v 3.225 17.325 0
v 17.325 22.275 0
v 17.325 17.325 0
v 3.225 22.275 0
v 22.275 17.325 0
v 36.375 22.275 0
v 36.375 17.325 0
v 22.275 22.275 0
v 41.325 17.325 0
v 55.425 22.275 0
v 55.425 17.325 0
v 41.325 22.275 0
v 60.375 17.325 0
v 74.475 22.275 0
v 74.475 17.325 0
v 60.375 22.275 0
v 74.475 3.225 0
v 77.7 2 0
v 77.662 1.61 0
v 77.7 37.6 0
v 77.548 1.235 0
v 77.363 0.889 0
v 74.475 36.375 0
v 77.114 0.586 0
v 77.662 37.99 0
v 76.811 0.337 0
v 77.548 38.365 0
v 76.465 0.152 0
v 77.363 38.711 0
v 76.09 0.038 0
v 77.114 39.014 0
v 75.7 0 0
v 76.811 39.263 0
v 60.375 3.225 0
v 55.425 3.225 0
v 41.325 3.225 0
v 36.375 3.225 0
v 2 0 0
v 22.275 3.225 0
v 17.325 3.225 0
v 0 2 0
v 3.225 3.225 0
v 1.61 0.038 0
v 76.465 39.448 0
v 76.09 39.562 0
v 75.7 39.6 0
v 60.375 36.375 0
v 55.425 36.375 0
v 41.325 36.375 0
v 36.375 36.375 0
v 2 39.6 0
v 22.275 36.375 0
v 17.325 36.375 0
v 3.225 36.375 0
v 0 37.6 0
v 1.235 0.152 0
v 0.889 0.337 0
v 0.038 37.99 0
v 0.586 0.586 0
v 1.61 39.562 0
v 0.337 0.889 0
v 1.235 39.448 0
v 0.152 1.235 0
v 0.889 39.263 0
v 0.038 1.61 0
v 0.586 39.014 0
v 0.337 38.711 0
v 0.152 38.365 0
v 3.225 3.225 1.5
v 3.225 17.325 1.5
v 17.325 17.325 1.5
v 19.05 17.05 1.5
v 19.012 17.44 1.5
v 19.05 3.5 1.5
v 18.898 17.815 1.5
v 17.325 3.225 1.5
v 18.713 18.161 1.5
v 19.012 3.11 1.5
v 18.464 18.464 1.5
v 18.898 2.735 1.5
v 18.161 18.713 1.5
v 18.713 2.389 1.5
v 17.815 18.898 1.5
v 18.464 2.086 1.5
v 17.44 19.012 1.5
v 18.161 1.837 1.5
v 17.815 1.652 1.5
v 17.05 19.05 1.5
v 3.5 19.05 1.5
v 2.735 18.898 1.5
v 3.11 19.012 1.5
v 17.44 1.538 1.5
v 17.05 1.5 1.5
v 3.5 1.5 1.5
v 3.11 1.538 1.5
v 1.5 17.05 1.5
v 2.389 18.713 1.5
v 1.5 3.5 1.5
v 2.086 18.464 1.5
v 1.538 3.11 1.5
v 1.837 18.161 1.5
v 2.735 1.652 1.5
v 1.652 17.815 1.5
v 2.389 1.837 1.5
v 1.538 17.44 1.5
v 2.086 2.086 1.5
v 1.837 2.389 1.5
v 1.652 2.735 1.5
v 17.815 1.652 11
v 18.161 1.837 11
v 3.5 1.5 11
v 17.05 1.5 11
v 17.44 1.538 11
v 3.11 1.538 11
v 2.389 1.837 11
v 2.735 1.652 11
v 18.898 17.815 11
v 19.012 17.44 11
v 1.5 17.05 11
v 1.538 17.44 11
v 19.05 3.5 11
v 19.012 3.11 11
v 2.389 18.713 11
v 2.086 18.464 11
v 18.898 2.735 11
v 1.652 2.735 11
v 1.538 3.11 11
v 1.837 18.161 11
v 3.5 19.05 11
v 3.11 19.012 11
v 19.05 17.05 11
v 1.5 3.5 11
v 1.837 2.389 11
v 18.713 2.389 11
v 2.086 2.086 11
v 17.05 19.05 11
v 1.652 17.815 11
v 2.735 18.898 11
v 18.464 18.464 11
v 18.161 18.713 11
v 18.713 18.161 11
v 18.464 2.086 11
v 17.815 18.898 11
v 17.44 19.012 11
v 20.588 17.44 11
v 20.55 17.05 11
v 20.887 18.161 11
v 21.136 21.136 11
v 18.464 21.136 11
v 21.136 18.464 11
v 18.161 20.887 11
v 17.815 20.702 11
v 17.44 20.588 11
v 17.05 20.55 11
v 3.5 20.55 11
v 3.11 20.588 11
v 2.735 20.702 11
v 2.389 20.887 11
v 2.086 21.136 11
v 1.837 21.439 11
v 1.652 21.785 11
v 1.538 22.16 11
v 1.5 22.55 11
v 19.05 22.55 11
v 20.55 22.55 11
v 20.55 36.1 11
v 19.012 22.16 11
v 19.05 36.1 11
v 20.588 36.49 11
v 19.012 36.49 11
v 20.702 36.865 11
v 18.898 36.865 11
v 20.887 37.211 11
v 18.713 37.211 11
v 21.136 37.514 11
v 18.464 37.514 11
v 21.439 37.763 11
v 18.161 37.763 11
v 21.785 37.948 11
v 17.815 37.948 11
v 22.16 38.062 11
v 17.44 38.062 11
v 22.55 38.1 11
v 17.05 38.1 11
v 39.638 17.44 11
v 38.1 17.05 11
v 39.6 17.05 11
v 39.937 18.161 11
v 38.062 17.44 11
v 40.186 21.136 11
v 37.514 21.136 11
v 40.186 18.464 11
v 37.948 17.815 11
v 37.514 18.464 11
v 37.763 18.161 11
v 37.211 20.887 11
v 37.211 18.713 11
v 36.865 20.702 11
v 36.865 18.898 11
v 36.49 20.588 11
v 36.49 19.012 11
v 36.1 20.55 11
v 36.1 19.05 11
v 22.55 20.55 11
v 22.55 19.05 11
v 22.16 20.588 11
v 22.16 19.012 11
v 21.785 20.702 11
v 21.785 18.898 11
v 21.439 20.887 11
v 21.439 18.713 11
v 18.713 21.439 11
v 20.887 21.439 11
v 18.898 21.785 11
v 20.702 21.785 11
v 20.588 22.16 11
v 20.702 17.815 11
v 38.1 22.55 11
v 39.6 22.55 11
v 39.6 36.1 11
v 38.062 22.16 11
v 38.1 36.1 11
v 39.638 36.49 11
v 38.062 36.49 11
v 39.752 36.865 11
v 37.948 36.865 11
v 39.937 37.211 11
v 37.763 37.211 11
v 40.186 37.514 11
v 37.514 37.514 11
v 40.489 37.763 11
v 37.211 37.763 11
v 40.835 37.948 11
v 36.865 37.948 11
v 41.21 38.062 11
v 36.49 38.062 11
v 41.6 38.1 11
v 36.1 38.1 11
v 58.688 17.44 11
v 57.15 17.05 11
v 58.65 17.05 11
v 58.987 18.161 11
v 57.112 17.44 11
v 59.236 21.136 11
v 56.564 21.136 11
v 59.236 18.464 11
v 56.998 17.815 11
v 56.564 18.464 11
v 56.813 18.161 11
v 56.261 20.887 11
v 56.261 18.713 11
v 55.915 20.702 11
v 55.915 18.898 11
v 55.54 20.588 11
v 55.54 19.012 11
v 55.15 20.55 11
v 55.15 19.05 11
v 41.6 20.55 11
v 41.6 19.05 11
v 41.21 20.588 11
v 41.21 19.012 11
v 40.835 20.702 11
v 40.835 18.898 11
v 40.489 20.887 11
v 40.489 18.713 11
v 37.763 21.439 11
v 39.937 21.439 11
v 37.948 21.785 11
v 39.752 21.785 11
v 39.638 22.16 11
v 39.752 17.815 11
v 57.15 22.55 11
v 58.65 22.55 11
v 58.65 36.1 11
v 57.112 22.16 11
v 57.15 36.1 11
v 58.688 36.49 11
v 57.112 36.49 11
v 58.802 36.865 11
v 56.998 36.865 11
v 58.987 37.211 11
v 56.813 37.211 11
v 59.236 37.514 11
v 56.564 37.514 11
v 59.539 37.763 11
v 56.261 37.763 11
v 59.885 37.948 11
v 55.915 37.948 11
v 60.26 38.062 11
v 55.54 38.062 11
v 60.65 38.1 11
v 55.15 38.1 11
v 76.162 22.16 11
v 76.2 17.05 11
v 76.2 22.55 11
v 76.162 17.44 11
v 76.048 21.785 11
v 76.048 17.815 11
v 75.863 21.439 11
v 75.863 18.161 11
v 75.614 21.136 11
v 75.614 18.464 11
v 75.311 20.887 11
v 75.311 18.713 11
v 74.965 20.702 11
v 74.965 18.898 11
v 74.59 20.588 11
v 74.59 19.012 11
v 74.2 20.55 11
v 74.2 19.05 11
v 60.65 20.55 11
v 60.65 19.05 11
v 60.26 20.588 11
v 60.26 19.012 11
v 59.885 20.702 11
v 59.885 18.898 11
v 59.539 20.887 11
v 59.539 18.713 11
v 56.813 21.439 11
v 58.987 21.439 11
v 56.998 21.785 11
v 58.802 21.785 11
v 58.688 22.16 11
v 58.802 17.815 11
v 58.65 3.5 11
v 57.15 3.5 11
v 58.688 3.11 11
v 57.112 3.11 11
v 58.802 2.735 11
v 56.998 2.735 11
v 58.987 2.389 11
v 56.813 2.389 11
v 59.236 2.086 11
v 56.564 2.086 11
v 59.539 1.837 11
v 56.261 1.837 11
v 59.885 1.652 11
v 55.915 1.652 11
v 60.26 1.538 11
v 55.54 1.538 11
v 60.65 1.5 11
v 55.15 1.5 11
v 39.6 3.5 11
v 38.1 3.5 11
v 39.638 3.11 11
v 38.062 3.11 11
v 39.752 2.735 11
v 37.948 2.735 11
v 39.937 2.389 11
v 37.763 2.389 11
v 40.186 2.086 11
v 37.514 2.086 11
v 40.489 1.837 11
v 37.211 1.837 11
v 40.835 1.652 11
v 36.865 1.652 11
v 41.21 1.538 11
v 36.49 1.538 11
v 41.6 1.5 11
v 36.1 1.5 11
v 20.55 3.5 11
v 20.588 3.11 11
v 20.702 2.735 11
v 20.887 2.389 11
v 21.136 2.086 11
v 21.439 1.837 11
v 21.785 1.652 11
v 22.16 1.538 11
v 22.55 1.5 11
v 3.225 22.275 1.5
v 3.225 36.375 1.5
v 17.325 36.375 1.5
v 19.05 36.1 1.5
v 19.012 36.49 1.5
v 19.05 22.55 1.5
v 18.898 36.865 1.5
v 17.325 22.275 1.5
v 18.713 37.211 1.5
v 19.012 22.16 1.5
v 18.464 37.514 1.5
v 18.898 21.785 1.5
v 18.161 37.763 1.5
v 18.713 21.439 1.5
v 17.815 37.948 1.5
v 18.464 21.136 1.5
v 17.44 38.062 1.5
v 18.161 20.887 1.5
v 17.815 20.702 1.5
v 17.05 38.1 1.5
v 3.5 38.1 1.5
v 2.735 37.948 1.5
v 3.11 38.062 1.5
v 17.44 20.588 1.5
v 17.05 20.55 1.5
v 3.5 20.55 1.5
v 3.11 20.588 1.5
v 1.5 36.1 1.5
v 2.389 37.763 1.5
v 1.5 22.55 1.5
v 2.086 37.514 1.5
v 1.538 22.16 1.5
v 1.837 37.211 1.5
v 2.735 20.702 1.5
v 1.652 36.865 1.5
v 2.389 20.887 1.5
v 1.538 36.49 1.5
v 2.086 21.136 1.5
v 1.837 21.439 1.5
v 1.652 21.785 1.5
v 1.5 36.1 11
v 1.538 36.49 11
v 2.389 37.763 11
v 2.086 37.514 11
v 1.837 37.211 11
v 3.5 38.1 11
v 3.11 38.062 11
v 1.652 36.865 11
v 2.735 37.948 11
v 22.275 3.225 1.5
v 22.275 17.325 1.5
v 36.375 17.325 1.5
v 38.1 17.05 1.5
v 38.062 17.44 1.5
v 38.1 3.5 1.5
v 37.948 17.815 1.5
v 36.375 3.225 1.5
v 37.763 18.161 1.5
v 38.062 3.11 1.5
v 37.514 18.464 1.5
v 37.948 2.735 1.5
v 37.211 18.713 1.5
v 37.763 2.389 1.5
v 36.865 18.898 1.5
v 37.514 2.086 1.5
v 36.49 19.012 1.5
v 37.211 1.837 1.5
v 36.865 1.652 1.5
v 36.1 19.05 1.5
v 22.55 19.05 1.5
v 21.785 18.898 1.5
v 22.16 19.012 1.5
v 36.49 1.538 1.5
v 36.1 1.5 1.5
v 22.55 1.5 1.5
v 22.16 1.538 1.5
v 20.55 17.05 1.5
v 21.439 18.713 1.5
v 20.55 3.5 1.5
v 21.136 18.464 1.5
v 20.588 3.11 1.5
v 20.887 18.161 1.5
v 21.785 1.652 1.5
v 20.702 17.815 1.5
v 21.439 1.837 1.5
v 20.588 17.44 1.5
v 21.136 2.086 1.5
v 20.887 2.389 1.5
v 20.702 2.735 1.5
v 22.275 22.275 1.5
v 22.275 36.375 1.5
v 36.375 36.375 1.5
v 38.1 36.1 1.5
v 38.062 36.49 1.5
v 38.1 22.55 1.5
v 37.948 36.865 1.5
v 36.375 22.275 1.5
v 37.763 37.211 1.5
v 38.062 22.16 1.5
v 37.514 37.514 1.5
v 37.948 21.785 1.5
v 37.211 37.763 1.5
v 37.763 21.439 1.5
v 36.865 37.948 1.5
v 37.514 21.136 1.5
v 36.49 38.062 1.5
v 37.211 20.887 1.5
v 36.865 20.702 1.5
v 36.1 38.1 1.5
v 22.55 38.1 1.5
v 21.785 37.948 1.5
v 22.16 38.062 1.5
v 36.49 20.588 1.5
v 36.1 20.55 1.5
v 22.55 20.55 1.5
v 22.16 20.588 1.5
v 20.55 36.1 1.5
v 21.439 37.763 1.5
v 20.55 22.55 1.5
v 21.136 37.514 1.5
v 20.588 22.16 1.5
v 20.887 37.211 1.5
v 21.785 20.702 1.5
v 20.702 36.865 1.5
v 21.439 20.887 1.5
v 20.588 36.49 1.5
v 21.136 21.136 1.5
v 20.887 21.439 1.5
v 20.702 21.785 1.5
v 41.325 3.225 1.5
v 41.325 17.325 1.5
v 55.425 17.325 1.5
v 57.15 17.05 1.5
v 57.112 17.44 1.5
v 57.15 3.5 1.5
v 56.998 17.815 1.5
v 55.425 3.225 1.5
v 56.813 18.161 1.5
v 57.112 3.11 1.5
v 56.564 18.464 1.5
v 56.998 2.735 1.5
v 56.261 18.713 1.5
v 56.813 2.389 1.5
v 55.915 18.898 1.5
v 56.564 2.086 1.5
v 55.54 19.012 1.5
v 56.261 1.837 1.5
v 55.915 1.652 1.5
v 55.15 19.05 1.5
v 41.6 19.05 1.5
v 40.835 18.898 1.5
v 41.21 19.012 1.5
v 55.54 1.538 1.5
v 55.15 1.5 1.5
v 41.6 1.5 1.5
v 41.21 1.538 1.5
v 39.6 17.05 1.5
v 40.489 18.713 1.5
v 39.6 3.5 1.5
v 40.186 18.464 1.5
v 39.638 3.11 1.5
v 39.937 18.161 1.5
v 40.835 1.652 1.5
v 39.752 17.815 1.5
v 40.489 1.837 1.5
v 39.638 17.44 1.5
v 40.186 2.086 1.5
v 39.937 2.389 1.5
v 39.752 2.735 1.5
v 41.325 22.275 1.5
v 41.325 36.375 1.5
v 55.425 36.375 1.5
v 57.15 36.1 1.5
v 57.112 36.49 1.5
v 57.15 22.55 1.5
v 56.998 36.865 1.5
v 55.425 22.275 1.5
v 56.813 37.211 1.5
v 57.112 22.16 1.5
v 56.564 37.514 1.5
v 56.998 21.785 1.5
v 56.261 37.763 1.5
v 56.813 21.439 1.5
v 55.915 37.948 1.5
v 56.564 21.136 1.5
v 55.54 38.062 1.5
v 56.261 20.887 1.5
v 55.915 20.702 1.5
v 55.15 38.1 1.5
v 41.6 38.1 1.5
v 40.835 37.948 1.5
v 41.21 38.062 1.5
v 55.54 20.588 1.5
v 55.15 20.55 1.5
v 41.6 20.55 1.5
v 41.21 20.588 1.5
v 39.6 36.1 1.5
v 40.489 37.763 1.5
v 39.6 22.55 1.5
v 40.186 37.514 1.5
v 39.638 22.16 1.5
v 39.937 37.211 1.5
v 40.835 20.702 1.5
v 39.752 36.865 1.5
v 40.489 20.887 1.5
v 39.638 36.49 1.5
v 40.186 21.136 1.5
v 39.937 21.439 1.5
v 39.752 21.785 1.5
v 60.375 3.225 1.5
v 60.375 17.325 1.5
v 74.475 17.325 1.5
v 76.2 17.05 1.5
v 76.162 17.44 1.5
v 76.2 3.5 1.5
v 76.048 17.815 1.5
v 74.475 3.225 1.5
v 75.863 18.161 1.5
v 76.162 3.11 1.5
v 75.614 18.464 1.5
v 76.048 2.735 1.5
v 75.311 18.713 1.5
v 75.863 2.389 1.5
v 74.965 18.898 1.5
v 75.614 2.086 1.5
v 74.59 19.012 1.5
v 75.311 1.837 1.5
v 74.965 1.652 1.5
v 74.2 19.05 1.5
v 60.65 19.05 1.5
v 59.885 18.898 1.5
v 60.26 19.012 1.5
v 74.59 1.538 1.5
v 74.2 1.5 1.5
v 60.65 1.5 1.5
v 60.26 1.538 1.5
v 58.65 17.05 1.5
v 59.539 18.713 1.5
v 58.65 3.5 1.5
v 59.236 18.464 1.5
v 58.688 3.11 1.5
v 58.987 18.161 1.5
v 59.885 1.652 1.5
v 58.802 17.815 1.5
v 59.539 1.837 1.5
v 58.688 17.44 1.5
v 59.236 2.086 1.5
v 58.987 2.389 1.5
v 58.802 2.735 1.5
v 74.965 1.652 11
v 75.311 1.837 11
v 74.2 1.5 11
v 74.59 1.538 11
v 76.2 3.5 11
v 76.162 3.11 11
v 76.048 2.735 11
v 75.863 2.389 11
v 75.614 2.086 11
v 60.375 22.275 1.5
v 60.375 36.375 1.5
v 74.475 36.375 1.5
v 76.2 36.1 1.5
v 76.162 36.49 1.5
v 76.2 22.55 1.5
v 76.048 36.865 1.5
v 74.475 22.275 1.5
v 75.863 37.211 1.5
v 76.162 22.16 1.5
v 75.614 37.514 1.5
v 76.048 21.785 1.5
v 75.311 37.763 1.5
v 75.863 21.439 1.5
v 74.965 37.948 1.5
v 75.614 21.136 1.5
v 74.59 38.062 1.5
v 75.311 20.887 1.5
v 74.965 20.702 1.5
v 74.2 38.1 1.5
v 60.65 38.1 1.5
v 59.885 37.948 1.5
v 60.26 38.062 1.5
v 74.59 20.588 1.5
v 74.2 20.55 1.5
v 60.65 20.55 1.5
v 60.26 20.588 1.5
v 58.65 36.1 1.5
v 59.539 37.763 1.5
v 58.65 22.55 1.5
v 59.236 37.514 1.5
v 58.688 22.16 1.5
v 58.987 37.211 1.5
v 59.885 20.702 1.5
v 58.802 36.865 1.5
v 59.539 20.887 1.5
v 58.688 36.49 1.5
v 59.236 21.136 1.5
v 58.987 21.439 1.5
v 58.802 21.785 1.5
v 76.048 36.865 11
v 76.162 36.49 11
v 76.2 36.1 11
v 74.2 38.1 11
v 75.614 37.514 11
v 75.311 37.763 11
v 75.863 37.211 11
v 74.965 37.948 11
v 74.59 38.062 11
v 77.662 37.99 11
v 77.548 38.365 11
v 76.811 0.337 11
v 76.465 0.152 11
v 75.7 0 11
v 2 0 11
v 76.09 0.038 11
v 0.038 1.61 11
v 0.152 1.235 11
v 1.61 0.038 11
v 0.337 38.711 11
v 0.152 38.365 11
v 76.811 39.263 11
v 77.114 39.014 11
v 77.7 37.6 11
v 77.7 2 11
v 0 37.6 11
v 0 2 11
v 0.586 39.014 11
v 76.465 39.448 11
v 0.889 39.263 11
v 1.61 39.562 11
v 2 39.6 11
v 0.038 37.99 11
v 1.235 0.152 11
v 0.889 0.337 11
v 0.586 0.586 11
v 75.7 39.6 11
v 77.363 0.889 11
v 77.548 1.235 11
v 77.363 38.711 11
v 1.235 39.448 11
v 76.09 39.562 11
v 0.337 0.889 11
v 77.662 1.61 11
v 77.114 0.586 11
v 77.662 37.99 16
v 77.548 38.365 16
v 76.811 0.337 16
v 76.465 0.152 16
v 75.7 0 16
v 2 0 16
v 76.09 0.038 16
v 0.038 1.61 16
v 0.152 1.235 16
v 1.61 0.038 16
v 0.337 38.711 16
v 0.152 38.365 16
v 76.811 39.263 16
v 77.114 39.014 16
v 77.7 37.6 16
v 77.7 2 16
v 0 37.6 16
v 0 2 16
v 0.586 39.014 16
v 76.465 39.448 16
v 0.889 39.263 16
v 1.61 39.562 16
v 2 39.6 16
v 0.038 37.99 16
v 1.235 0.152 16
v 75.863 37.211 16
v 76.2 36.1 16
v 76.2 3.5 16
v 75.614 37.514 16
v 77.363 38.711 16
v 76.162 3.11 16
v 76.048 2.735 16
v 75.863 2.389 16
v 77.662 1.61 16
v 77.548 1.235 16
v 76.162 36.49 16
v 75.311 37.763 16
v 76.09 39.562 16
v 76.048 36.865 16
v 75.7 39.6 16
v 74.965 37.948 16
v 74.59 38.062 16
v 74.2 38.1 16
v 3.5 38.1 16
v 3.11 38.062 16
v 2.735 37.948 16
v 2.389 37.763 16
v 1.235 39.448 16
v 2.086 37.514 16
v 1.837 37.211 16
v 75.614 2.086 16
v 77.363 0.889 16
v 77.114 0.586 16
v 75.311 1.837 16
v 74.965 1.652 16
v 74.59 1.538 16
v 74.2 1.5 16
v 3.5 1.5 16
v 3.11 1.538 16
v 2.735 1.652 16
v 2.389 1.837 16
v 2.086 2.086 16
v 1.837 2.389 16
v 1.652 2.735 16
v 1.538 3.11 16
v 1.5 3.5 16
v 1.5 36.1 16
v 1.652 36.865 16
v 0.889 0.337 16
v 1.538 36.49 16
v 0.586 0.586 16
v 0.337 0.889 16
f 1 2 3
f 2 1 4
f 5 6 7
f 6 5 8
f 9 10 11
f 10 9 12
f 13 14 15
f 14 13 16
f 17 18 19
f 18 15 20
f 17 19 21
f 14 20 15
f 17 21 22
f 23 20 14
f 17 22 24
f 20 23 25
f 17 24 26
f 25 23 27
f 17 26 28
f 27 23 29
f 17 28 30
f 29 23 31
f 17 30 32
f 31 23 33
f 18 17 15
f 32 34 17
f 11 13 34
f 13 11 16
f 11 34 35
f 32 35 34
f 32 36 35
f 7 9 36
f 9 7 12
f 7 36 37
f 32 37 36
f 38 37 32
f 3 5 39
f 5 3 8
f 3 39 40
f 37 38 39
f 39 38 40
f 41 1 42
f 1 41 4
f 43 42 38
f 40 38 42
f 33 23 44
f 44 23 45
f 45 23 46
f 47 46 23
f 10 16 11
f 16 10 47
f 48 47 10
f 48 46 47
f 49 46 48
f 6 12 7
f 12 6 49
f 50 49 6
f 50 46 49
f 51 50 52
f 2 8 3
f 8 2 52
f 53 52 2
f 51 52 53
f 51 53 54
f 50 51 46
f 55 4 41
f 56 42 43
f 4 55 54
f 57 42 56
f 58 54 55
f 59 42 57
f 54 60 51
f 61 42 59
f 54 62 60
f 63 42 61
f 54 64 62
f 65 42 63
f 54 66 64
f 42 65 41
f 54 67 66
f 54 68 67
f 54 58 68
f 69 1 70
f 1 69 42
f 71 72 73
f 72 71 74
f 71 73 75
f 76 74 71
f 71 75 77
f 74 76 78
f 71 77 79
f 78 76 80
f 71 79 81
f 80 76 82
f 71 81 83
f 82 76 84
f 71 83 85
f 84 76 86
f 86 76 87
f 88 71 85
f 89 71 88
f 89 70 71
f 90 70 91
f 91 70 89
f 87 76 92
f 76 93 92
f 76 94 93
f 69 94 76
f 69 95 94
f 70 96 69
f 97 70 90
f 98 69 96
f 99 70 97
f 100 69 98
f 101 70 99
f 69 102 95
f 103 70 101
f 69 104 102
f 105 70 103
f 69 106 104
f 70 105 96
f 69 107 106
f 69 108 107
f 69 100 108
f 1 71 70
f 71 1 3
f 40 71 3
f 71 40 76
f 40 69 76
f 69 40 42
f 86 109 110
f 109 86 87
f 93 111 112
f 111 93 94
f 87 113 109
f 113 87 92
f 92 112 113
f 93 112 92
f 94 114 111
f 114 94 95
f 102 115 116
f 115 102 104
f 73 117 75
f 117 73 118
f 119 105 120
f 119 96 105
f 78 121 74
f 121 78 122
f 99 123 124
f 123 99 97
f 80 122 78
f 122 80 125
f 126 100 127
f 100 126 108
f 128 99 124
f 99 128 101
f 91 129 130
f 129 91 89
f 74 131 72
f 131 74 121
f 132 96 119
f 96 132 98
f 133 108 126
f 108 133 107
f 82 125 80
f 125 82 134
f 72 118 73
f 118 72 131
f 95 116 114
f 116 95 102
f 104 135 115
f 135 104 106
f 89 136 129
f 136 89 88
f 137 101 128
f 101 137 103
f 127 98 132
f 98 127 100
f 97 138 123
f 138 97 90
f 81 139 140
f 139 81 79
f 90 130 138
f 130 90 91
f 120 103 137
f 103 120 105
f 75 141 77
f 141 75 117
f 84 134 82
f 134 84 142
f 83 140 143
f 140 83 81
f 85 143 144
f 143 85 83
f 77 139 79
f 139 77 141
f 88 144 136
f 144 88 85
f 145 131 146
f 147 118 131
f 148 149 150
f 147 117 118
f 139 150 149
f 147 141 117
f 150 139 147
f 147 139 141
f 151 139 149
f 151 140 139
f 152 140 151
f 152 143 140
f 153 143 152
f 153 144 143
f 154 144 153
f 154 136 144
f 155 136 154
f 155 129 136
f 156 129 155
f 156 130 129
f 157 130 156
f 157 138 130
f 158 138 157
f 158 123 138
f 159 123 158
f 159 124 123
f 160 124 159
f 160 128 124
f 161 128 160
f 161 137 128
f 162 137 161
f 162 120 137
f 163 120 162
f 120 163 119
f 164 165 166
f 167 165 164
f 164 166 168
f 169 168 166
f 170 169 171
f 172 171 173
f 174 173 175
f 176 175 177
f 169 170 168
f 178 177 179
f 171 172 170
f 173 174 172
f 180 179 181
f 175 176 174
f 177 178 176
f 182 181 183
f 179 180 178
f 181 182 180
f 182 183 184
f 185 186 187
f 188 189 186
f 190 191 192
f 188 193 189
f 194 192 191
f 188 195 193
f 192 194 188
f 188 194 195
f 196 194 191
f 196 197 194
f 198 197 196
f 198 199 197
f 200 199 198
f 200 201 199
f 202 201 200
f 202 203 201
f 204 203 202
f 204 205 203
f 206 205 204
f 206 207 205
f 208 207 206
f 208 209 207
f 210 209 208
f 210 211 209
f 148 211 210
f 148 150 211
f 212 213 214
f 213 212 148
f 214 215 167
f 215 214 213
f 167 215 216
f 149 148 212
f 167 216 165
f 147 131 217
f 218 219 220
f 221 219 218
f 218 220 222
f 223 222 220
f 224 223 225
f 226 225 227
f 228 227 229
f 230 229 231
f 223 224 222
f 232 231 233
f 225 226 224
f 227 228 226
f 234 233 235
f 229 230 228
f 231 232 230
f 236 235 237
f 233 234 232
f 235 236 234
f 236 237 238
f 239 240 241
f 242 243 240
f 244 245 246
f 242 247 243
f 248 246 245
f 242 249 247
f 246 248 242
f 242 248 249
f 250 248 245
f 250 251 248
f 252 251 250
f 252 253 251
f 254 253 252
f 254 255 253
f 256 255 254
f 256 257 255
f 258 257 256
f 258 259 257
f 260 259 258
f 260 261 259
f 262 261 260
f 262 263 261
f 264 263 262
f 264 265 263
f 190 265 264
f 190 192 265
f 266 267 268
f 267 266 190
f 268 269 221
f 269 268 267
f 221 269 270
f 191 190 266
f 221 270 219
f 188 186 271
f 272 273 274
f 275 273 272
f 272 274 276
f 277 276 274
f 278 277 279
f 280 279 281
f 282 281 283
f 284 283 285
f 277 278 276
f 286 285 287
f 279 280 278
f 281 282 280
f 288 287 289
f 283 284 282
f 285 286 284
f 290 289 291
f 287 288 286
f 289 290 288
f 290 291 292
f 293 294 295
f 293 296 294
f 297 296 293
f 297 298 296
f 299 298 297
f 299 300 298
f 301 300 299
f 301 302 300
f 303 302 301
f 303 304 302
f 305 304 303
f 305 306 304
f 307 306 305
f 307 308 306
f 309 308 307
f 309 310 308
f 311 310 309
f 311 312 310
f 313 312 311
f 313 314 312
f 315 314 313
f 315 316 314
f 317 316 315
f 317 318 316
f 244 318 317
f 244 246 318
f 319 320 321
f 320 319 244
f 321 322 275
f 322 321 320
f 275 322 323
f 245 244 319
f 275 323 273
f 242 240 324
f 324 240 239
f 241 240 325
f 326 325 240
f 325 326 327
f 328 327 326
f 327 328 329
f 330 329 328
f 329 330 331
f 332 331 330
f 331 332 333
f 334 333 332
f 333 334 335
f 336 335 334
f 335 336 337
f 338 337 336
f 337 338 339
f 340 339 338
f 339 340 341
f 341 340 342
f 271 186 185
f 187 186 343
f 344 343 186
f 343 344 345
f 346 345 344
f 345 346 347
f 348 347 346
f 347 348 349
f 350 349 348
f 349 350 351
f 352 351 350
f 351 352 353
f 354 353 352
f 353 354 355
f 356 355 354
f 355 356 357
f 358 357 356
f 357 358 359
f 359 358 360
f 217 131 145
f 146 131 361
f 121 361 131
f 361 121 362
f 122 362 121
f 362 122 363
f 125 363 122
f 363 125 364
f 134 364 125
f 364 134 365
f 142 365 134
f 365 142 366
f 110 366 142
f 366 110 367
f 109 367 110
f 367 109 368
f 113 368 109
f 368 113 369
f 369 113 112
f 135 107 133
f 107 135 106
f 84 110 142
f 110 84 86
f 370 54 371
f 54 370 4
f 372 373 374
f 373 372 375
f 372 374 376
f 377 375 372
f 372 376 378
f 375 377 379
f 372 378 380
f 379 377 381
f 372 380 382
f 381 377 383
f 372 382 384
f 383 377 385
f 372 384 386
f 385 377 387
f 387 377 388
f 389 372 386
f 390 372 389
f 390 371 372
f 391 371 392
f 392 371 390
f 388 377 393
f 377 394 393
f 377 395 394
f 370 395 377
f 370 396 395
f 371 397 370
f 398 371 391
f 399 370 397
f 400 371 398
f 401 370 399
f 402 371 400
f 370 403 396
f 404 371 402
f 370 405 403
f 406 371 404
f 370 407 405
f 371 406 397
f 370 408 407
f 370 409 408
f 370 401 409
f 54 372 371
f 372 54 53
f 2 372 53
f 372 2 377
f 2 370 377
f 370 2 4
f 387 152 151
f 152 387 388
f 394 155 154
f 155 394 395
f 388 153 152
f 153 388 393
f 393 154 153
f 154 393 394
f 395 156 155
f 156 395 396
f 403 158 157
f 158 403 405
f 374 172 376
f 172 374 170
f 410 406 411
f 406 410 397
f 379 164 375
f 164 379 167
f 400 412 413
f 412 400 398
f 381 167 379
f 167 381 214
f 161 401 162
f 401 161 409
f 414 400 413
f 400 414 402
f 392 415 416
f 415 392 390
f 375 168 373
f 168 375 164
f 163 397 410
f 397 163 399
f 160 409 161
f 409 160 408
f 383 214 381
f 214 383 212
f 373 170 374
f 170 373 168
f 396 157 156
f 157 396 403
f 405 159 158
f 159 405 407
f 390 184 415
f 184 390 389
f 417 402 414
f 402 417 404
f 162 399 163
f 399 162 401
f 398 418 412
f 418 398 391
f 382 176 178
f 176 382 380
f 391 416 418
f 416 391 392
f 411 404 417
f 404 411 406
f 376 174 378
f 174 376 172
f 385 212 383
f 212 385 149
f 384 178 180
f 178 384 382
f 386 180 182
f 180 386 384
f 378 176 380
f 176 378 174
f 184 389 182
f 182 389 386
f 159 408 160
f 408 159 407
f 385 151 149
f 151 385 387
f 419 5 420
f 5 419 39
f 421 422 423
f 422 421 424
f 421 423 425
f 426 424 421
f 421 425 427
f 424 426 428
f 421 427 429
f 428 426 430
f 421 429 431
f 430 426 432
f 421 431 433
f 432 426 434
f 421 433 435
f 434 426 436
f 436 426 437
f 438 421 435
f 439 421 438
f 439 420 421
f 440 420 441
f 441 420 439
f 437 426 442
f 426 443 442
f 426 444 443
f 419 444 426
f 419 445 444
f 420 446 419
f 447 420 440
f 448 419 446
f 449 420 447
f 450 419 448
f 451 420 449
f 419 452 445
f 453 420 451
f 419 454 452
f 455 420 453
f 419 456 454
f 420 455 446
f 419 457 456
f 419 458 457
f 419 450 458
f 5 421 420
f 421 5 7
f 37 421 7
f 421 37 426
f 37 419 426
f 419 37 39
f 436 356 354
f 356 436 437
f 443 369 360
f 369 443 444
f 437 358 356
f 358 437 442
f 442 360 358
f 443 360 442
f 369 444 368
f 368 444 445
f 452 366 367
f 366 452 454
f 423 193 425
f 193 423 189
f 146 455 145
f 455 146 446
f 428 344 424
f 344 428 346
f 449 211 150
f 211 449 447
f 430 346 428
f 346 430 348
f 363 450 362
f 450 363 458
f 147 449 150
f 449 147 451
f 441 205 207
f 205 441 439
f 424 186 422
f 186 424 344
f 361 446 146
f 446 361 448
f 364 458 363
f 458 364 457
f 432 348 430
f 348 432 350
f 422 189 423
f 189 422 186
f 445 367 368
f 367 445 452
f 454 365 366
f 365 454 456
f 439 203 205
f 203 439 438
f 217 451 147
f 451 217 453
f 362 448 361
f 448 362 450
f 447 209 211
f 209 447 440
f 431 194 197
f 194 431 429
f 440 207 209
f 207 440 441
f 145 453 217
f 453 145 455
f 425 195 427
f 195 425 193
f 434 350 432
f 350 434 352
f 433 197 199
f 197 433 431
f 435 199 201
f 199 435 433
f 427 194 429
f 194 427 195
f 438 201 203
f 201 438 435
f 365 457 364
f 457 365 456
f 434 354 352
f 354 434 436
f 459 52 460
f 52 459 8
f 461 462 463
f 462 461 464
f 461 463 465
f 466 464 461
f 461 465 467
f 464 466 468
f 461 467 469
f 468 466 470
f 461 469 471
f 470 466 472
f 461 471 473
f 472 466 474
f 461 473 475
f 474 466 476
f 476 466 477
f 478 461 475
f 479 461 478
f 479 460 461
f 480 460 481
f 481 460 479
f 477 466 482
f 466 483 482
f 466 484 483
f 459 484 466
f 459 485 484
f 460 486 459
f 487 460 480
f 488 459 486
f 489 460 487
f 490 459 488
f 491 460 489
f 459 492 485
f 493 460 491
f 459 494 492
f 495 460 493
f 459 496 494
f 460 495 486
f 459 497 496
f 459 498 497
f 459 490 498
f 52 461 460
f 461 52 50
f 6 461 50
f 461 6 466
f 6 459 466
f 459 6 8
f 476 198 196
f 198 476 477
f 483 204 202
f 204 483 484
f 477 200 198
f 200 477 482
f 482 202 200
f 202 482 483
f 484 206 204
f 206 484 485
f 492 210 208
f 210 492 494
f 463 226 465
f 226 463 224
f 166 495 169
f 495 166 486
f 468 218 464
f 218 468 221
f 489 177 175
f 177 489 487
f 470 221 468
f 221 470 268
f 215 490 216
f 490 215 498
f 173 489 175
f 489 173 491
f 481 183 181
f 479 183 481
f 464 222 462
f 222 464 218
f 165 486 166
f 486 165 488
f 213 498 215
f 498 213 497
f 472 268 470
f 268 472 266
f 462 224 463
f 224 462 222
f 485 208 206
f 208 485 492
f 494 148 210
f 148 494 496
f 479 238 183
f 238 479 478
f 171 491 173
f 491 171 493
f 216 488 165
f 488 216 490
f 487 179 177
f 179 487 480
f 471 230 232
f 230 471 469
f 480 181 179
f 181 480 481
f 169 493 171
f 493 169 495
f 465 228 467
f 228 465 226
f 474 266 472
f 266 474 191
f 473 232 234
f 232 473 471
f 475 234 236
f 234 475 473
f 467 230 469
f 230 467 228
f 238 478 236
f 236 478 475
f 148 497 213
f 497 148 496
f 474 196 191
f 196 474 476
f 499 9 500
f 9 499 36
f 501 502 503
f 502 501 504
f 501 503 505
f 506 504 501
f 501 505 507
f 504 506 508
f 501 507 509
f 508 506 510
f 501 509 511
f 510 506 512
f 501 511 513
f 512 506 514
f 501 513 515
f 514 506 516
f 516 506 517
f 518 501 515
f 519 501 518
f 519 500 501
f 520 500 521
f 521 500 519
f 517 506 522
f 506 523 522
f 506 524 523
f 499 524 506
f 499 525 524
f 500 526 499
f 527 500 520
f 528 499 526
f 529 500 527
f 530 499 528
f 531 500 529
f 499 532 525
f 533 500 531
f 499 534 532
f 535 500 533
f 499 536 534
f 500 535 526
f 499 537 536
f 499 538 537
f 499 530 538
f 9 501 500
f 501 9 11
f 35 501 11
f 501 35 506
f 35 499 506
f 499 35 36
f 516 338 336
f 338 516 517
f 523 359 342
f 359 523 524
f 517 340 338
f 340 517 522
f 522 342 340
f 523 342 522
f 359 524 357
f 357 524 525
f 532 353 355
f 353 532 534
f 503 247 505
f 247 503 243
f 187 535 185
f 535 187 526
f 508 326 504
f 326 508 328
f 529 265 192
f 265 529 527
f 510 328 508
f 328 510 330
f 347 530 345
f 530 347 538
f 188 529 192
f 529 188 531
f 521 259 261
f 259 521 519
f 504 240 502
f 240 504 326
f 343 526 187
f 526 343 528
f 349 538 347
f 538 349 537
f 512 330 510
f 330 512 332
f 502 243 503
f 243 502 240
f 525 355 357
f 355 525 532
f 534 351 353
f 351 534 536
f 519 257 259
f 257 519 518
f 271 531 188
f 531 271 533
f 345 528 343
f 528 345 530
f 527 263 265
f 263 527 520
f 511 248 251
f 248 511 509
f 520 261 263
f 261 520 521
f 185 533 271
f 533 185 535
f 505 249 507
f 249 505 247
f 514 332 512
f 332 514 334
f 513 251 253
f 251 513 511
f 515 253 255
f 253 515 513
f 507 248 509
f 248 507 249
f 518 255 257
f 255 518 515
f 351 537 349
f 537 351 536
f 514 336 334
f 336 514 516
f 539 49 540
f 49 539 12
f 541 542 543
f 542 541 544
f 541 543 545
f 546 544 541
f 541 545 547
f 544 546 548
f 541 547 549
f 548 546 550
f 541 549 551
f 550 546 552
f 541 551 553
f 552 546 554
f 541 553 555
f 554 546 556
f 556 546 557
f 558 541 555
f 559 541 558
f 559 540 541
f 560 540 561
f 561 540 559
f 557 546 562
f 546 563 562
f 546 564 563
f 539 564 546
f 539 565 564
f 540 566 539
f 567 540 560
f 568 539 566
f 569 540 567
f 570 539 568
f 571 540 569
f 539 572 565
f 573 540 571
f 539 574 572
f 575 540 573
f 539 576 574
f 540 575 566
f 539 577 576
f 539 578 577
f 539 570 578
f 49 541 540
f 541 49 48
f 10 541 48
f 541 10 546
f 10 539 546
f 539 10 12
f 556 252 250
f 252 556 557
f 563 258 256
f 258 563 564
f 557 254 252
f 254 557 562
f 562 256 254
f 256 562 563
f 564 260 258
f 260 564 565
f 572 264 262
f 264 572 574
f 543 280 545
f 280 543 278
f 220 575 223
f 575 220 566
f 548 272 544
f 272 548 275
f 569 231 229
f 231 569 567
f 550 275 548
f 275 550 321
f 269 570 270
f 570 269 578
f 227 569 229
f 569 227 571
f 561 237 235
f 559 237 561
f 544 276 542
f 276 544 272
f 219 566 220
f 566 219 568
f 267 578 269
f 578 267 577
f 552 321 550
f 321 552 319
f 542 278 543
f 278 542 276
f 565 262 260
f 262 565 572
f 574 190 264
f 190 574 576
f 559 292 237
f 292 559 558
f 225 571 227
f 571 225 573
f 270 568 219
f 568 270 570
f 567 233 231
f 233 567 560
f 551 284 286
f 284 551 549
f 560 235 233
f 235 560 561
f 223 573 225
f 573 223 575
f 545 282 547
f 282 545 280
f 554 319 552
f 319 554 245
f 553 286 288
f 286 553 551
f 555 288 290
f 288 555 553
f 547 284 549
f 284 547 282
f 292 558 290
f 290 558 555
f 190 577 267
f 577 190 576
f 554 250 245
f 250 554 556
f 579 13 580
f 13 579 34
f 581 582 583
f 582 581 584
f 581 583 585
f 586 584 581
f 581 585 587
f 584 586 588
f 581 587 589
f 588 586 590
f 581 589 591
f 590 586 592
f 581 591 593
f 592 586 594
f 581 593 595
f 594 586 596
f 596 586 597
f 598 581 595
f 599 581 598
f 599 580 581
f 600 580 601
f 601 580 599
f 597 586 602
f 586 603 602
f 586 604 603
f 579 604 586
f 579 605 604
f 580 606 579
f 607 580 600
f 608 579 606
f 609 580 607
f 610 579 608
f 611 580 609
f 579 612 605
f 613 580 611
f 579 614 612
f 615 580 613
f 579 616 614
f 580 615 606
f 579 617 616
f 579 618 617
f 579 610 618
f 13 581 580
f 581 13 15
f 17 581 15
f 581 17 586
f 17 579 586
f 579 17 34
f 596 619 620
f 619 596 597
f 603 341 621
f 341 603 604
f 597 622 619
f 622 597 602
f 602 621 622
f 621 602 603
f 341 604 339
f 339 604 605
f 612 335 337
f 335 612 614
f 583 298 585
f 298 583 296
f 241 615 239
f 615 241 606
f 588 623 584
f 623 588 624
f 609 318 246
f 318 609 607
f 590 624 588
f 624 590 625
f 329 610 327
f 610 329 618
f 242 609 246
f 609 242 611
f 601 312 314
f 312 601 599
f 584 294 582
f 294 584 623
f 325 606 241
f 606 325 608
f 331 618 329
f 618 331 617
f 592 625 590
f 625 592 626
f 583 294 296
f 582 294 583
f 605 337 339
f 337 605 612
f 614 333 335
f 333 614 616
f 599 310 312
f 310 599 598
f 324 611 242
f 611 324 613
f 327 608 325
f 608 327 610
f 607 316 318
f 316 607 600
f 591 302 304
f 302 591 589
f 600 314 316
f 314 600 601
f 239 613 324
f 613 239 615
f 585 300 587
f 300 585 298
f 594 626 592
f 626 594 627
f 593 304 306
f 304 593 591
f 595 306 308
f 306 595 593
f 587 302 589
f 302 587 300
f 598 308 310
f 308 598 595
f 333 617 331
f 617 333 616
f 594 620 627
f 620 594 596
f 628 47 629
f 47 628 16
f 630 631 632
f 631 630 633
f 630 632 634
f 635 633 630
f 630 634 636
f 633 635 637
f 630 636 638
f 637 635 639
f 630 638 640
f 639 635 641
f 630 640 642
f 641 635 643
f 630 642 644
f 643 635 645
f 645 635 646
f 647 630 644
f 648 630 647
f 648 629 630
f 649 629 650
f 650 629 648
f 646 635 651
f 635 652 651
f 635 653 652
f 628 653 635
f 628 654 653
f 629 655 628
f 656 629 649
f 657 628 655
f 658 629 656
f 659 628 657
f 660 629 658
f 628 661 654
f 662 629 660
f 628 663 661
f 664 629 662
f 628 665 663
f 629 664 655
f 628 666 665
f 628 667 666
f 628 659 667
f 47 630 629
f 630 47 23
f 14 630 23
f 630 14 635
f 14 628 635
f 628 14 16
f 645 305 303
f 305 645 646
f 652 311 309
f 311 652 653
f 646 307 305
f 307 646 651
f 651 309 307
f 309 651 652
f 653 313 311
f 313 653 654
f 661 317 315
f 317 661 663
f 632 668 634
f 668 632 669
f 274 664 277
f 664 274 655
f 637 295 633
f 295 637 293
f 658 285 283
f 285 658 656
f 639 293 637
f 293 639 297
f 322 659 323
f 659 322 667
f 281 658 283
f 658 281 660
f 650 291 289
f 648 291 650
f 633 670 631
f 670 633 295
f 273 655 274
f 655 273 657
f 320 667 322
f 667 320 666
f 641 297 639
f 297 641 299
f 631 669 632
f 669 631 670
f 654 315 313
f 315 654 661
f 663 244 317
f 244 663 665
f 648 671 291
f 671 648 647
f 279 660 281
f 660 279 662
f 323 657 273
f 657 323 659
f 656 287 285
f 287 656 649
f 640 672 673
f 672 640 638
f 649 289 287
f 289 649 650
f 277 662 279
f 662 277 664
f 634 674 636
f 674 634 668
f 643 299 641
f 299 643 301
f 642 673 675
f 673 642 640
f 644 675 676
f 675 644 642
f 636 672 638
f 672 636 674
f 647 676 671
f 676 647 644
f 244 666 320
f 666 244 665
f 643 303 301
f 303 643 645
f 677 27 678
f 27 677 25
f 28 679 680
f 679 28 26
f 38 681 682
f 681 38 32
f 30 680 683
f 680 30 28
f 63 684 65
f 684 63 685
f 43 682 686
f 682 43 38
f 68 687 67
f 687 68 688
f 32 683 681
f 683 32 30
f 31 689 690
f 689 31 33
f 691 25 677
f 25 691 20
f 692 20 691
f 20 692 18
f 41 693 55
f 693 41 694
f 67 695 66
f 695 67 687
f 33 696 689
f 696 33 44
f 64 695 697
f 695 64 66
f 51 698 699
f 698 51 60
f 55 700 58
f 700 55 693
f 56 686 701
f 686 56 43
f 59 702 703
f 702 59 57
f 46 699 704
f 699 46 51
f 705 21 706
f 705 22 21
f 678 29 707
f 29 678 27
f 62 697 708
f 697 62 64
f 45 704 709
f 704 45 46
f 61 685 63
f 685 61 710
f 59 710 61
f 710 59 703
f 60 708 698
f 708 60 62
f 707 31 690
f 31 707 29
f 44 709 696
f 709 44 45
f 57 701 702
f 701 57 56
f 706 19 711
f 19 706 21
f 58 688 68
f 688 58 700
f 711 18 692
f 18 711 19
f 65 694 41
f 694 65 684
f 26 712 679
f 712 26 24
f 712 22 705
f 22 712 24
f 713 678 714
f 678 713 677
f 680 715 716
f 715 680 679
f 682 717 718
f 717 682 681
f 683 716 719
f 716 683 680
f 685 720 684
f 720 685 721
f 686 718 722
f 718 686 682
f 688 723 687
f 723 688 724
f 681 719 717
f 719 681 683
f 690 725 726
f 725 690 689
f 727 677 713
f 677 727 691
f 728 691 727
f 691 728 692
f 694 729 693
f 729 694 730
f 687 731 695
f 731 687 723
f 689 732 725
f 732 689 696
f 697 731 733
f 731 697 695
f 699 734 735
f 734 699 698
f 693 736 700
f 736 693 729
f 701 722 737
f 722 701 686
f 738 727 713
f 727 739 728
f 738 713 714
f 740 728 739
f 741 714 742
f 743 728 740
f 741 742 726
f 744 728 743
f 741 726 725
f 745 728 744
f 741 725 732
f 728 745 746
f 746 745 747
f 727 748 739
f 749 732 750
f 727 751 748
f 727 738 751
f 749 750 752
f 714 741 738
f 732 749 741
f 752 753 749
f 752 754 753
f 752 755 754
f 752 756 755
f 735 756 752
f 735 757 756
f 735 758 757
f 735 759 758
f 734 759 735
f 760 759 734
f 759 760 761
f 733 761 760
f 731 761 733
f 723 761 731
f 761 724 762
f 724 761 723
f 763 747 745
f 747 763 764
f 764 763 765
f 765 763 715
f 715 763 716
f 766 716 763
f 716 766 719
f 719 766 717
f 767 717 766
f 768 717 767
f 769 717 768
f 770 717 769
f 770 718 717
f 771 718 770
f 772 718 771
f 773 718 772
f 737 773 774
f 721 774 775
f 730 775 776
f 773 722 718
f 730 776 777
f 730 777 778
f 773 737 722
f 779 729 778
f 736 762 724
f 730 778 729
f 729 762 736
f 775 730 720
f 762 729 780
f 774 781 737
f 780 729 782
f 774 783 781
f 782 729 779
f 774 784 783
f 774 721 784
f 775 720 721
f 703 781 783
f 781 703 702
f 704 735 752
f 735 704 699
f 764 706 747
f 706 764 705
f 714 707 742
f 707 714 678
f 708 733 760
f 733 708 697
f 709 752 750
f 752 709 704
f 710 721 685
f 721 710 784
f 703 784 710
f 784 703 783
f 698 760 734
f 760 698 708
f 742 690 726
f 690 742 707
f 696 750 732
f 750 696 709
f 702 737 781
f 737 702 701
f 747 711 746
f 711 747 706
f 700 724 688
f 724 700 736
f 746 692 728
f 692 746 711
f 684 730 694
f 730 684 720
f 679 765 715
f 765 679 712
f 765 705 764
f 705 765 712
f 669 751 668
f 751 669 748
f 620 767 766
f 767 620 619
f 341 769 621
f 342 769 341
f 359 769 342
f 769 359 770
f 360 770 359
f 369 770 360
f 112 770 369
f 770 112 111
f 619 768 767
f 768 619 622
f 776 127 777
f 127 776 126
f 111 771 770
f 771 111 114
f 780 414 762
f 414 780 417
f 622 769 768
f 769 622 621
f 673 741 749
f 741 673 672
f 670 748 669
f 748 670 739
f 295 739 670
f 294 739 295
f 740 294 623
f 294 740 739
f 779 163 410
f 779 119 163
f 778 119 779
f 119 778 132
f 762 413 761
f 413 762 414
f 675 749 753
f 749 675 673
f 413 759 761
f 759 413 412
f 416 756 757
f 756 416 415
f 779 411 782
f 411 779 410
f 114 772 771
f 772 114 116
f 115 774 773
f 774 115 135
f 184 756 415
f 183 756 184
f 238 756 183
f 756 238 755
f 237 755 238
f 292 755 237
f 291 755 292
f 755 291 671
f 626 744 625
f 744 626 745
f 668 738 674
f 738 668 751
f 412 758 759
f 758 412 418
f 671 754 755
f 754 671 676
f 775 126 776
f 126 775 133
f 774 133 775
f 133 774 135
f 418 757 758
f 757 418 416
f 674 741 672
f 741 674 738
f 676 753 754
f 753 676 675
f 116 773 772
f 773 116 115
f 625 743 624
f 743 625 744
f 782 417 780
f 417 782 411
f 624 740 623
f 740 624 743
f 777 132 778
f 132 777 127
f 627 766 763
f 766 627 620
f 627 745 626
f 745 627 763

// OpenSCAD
ROWS = 2;
COLUMNS = 4;
SWITCH_HEIGHT = 11;
SKIRT_HEIGHT = 5;
TOLERANCE = 0.1;
PLATE_THICKNESS = 1.5;      // Official spec for Cherry MX is 1.5 ± 0.1 mm
BOTTOM_PLATE_THICKNESS = 1; // Official spec for Cherry MX is 1.5 ± 0.1 mm
WALL_THICKNESS = 1.5;
CORNER_RADIUS = 2;

// See https://matt3o.com/anatomy-of-a-keyboard/
SWITCH_HOLE_SIZE = 14;
SWITCH_DISTANCE_BETWEEN_HOLES = 5.05;

$fn = 32;

module body_main(ROWS = ROWS, COLUMNS = COLUMNS, SWITCH_HEIGHT = SWITCH_HEIGHT, SKIRT_HEIGHT = SKIRT_HEIGHT,
                 TOLERANCE = TOLERANCE, PLATE_THICKNESS = PLATE_THICKNESS,
                 BOTTOM_PLATE_THICKNESS = BOTTOM_PLATE_THICKNESS, WALL_THICKNESS = WALL_THICKNESS,
                 CORNER_RADIUS = CORNER_RADIUS)
{
    keycap_placeholder_space = SWITCH_HOLE_SIZE + SWITCH_DISTANCE_BETWEEN_HOLES;
    x_size = keycap_placeholder_space * COLUMNS + WALL_THICKNESS;
    y_size = keycap_placeholder_space * ROWS + WALL_THICKNESS;
    x_size_corrected = x_size - CORNER_RADIUS * 2;
    y_size_corrected = y_size - CORNER_RADIUS * 2;
    x_inner_size_corrected = x_size_corrected - WALL_THICKNESS * 2;
    y_inner_size_corrected = y_size_corrected - WALL_THICKNESS * 2;

    module hole()
    {
        translate([ keycap_placeholder_space / 2, keycap_placeholder_space / 2, 0 ])
        {
            // Keycap Mock
            // translate([ 0, 0, 8 ]) color("red") linear_extrude(height = 8) square(keycap_placeholder_space, center =
            // true);

            // Plate hole
            color("blue") linear_extrude(height = PLATE_THICKNESS) square(SWITCH_HOLE_SIZE + TOLERANCE, center = true);

            // Structural hole
            translate([ 0, 0, PLATE_THICKNESS ]) linear_extrude(height = SWITCH_HEIGHT - PLATE_THICKNESS)
                offset(r = CORNER_RADIUS)
                    square(keycap_placeholder_space - CORNER_RADIUS * 2 - WALL_THICKNESS, center = true);
        }
    }

    module body()
    {
        difference()
        {
            // Body
            translate([ x_size / 2, y_size / 2, 0 ]) difference()
            {
                linear_extrude(height = SWITCH_HEIGHT) offset(r = CORNER_RADIUS)
                    square([ x_size_corrected, y_size_corrected ], center = true);

                // hull()
                // {
                //     translate([ 0, 0, SWITCH_HEIGHT / 4 ]) linear_extrude(height = 0.0001)
                //         offset(delta = -WALL_THICKNESS - keycap_placeholder_space / 3)
                //             square([ x_size, y_size ], center = true);
                //     translate([ 0, 0, SWITCH_HEIGHT ]) linear_extrude(height = 0.0001) offset(delta = -WALL_THICKNESS
                //     * 2)
                //         square([ x_size, y_size ], center = true);
                // }
            }

            // Holes
            translate([ WALL_THICKNESS / 2, WALL_THICKNESS / 2, 0 ])
            {
                for (column = [0:COLUMNS - 1])
                {
                    for (row = [0:ROWS - 1])
                    {
                        translate([ column * keycap_placeholder_space, row * keycap_placeholder_space, 0 ]) hole();
                    }
                }
            }
        }

        // Skirt
        translate([ x_size / 2, y_size / 2, SWITCH_HEIGHT ]) difference()
        {
            linear_extrude(height = SKIRT_HEIGHT) offset(r = CORNER_RADIUS)
                square([ x_size_corrected, y_size_corrected ], center = true);

            linear_extrude(height = SKIRT_HEIGHT) offset(r = CORNER_RADIUS)
                square([ x_inner_size_corrected, y_inner_size_corrected ], center = true);
        }
    }

    body();
}

body_main();
